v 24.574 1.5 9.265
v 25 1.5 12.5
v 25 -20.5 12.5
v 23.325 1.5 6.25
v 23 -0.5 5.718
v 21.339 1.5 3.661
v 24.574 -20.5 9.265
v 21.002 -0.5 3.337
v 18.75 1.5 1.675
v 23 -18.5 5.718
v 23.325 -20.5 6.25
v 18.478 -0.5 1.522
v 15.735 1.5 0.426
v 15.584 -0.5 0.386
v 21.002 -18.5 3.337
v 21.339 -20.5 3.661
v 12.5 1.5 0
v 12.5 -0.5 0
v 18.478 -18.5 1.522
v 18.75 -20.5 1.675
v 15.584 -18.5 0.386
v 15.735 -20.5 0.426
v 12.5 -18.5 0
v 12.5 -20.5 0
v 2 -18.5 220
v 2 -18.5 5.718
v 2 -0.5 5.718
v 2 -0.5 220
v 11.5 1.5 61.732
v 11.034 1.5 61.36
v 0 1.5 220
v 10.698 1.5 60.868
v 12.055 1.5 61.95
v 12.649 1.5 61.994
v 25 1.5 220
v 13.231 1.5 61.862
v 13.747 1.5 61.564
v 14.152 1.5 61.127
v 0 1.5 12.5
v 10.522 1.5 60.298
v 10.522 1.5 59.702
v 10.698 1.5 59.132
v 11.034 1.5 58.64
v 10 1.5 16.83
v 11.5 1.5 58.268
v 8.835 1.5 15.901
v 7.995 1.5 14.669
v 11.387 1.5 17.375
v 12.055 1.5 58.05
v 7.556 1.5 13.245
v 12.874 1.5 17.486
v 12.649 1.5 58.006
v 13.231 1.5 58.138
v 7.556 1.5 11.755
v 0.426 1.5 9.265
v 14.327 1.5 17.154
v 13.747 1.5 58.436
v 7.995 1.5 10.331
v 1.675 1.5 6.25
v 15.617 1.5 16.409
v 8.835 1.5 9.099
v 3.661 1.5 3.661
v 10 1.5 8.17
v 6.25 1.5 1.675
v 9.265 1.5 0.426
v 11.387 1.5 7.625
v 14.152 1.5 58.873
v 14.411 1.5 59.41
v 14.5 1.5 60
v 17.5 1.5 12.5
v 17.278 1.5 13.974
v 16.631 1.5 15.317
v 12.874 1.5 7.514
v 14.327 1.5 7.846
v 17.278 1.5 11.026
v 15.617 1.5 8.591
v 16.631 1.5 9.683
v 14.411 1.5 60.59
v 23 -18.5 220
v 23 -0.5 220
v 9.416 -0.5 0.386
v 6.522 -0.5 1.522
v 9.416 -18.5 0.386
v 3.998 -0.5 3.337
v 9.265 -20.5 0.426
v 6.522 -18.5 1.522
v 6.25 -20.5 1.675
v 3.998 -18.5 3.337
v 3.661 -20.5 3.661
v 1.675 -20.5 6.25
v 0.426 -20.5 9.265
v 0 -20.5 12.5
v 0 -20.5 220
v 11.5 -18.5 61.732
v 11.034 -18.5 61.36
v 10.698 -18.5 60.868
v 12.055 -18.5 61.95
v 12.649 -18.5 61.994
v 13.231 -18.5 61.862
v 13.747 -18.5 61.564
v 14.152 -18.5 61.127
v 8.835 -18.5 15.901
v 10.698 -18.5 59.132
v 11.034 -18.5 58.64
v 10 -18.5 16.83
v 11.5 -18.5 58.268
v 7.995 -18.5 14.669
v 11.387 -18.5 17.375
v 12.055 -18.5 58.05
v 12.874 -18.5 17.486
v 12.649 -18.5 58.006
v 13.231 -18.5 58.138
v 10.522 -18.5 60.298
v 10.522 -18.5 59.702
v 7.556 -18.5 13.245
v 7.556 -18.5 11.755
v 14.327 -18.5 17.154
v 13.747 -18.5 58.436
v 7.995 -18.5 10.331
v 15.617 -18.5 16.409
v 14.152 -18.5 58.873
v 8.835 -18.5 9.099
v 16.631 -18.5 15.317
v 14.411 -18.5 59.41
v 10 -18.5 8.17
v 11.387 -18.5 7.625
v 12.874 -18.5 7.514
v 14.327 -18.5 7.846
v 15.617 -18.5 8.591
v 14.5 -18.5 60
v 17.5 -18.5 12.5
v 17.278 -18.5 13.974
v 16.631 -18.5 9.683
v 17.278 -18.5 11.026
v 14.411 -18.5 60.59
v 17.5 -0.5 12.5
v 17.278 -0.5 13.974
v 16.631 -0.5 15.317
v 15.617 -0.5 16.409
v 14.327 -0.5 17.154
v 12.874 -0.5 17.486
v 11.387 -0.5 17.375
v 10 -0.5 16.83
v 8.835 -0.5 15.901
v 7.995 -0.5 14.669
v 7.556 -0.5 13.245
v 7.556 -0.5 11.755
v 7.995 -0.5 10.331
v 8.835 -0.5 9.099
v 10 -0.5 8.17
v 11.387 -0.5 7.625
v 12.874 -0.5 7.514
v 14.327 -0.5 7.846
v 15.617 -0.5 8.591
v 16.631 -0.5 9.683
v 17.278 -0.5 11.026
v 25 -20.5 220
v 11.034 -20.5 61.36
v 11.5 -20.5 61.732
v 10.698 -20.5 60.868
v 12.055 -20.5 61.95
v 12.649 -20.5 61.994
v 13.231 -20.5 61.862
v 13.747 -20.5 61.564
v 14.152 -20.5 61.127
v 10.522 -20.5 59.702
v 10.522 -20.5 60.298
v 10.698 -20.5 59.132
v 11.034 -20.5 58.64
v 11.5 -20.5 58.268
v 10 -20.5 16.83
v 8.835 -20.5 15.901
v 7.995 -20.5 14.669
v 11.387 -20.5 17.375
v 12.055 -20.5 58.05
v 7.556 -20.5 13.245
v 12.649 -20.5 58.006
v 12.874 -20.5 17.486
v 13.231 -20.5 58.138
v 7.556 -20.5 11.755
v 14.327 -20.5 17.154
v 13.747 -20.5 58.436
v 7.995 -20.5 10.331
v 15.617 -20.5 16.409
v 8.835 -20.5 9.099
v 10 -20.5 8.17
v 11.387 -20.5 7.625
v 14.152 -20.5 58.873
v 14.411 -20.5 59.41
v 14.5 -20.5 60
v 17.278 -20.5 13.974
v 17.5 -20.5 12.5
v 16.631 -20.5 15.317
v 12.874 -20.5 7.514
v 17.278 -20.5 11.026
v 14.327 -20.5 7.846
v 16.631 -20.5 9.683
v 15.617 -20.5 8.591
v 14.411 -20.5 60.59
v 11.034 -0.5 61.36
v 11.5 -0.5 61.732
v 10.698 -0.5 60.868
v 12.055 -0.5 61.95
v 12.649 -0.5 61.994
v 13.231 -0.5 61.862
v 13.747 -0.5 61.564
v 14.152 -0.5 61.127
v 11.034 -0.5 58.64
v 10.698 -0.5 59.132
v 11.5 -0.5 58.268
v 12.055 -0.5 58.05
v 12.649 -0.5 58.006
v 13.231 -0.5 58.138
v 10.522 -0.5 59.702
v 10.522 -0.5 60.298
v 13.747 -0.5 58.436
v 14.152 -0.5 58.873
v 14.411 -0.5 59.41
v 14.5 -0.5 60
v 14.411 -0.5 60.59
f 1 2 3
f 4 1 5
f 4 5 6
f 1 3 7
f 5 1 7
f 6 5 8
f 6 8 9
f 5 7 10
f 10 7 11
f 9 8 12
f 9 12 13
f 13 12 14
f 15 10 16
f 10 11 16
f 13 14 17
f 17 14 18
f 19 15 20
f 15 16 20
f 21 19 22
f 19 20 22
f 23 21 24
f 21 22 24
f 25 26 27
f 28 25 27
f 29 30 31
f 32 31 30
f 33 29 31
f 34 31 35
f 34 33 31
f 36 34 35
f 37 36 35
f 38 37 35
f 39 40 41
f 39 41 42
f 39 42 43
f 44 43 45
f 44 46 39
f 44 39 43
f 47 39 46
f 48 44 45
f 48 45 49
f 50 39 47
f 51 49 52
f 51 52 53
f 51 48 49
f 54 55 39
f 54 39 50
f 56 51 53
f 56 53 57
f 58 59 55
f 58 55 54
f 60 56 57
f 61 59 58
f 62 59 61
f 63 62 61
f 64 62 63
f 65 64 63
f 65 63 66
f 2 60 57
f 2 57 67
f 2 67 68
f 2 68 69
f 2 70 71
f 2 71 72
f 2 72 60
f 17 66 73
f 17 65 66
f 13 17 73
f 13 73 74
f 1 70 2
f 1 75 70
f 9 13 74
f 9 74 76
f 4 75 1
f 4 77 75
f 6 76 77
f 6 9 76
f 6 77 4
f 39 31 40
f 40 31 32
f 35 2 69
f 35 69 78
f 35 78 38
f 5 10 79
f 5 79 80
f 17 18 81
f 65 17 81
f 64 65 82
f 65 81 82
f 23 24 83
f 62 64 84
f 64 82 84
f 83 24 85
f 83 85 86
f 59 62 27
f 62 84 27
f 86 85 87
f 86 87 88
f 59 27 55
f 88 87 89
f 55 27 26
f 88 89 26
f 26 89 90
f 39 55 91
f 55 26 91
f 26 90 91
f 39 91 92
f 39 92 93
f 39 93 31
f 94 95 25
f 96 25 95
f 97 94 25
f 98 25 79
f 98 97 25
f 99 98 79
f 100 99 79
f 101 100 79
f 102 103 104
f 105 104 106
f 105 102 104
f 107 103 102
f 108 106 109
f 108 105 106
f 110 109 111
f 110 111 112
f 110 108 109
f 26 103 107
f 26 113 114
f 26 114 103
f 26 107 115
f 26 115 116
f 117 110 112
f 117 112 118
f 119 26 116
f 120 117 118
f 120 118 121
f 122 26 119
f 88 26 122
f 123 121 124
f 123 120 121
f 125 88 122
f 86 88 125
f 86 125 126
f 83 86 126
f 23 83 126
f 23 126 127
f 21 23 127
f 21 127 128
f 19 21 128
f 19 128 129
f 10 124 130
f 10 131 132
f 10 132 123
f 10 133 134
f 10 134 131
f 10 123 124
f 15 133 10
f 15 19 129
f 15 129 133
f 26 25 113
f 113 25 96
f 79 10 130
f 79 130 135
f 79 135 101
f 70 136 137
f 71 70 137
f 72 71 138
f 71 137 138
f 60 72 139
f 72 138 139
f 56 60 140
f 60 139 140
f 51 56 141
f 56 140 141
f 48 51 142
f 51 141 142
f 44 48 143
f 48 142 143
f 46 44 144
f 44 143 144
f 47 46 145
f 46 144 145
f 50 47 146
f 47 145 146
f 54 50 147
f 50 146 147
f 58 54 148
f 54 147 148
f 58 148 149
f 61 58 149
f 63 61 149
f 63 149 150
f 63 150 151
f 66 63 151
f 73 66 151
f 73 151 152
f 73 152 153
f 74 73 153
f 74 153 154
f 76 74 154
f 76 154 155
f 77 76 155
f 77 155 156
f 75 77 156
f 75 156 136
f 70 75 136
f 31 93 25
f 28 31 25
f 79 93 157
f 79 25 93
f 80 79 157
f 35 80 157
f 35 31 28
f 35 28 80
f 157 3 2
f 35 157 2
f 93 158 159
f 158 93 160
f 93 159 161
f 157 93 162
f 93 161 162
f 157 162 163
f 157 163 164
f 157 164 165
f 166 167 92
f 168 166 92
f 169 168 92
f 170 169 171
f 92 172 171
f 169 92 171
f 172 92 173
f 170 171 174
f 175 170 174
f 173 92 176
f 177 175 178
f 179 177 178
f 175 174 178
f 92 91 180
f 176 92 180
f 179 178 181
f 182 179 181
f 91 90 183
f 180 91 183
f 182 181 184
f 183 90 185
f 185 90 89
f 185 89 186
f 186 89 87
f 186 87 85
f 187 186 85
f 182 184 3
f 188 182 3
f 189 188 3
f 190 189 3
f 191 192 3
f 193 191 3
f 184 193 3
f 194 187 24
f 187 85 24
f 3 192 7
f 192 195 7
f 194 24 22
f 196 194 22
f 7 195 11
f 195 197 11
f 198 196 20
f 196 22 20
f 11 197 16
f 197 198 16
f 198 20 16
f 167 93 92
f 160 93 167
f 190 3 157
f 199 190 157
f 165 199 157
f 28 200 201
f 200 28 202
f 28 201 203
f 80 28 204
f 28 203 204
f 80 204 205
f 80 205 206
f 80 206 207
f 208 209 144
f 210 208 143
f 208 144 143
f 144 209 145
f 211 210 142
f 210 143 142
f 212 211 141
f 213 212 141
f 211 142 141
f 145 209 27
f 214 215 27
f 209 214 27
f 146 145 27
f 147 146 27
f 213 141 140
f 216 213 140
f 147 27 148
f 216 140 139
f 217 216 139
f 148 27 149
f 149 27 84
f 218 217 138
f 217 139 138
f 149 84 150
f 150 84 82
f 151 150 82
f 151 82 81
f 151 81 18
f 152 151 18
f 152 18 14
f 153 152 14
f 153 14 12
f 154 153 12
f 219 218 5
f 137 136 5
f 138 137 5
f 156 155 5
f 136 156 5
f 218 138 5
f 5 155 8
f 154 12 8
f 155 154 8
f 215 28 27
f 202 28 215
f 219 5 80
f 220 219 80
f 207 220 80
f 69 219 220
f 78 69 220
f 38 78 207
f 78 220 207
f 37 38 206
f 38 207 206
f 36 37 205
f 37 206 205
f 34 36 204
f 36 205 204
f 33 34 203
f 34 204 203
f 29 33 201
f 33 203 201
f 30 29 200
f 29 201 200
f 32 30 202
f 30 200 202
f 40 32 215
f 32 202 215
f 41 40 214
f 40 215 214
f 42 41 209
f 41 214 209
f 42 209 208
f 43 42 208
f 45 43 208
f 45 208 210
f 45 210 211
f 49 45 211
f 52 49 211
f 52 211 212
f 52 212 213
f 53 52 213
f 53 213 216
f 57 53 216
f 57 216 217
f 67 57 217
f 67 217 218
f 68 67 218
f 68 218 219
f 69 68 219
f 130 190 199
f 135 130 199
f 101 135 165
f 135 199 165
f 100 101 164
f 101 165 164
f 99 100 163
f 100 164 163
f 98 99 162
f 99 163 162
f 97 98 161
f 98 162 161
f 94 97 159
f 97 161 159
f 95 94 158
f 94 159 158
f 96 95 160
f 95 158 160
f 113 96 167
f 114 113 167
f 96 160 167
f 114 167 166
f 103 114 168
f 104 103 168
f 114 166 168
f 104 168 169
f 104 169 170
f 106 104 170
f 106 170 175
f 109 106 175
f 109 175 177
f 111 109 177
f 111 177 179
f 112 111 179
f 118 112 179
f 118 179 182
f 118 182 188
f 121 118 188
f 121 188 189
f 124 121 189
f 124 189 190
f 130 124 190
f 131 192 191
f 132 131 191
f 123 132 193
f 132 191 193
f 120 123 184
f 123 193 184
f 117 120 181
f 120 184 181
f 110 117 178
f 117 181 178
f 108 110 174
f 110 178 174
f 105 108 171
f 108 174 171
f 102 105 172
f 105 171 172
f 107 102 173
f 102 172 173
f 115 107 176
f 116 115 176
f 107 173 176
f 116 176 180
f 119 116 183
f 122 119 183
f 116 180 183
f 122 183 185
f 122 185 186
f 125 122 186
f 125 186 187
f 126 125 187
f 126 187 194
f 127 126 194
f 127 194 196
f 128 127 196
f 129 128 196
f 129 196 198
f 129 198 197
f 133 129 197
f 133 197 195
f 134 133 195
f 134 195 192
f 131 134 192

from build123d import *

# Parameters (mm, degrees)
SZKIC1_W                          = 25
SZKIC1_H                          = 22
SZKIC1_W_2                        = 21
SZKIC1_H_2                        = 18
WYCI_GNI_CIE_CIENKA_CIANKA1_DEPTH = 220
WYTNIJ_WYCI_GNI_CIE1_DEPTH        = 23
SZKIC3_R                          = 5
WYTNIJ_WYCI_GNI_CIE2_DEPTH        = 23
SZKIC4_R                          = 2
WYTNIJ_WYCI_GNI_CIE3_DEPTH        = 23


with BuildPart() as part:
    # Szkic1 → Wyciągnięcie-cienka ścianka1 (new body)
    with BuildSketch(Plane.XY):
        with Locations((12.5, -9.5)):
            Rectangle(SZKIC1_W, SZKIC1_H)
        with Locations((12.5, -9.5)):
            Rectangle(SZKIC1_W_2, SZKIC1_H_2, mode=Mode.SUBTRACT)
    extrude(amount=WYCI_GNI_CIE_CIENKA_CIANKA1_DEPTH)

    # Szkic2 → Wytnij-wyciągnięcie1 (cut, through all)
    with BuildSketch(Plane.XZ.offset(20.5)):
        with BuildLine():
            ThreePointArc((12.5, 0), (3.661165235, 3.661165235), (0, 12.5))
            Line((0, 12.5), (0, 0))
            Line((0, 0), (12.5, 0))
        make_face()
        with BuildLine():
            ThreePointArc((25, 12.5), (21.338834765, 3.661165235), (12.5, 0))
            Line((12.5, 0), (25, 0))
            Line((25, 0), (25, 12.5))
        make_face()
    extrude(amount=-WYTNIJ_WYCI_GNI_CIE1_DEPTH, mode=Mode.SUBTRACT)

    # Szkic3 → Wytnij-wyciągnięcie2 (cut, through all)
    with BuildSketch(Plane.XZ.offset(20.5)):
        with Locations((12.5, 12.5)):
            Circle(SZKIC3_R)
    extrude(amount=-WYTNIJ_WYCI_GNI_CIE2_DEPTH, mode=Mode.SUBTRACT)

    # Szkic4 → Wytnij-wyciągnięcie3 (cut, through all)
    with BuildSketch(Plane.XZ.offset(20.5)):
        with Locations((12.5, 60)):
            Circle(SZKIC4_R)
    extrude(amount=-WYTNIJ_WYCI_GNI_CIE3_DEPTH, mode=Mode.SUBTRACT)


solid = part.part
